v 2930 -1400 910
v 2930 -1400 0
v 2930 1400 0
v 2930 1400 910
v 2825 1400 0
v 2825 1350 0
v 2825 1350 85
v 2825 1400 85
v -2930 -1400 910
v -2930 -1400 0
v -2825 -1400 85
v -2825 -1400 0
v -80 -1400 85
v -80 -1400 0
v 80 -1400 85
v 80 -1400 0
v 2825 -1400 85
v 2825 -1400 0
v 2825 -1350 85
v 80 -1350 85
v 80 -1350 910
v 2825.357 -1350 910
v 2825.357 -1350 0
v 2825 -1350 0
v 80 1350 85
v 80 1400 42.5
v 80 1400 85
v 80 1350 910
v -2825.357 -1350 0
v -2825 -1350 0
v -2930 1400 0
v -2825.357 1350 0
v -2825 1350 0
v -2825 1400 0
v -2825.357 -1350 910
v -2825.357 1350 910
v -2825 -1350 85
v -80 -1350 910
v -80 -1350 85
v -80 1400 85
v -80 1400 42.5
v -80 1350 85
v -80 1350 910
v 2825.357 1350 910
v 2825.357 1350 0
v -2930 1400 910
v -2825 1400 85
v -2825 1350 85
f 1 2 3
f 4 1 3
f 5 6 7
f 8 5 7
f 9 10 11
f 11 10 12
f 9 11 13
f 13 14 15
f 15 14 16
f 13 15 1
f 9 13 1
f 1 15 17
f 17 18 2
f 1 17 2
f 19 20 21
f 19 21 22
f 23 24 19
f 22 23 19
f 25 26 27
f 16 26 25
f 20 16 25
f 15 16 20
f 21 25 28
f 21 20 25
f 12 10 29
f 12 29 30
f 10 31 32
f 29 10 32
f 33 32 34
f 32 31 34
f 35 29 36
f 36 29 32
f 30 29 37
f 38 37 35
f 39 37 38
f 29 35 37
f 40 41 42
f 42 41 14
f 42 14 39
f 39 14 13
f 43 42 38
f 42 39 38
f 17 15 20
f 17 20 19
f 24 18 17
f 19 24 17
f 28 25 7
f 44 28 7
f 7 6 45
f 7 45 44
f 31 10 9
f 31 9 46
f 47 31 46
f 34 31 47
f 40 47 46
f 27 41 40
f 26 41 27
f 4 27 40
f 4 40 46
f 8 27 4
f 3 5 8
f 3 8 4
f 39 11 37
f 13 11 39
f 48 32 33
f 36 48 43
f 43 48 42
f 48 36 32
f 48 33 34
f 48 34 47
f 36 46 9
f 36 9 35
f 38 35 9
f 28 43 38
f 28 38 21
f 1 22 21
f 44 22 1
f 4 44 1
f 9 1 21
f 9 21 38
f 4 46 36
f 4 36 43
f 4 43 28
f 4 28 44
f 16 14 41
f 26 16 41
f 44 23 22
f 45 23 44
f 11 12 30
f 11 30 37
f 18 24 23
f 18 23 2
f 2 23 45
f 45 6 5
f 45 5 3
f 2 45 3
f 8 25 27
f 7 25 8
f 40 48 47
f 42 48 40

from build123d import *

# Parameters (mm, degrees)
SKETCH_1_W          = 5860
SKETCH_1_H          = 2800
SKETCH_1_W_2        = 2745.357142857
SKETCH_1_H_2        = 2700
EXTRUDE_1_DEPTH     = 910
SKETCH_2_W          = 2745
SKETCH_2_H          = 85
CUT_EXTRUDE_1_DEPTH = 2801
CUT_EXTRUDE_2_DEPTH = 160


with BuildPart() as part:
    # Эскиз1 → Бобышка-Вытянуть1 (new body)
    with BuildSketch(Plane.XY):
        Rectangle(SKETCH_1_W, SKETCH_1_H)
        with Locations((-1452.678571429, 0)):
            Rectangle(SKETCH_1_W_2, SKETCH_1_H_2, mode=Mode.SUBTRACT)
        with Locations((1452.678571429, 0)):
            Rectangle(SKETCH_1_W_2, SKETCH_1_H_2, mode=Mode.SUBTRACT)
    extrude(amount=EXTRUDE_1_DEPTH)

    # Эскиз2 → Вырез-Вытянуть1 (cut, through all)
    with BuildSketch(Plane.XZ.offset(1400)):
        with Locations((-1452.5, 42.5)):
            Rectangle(SKETCH_2_W, SKETCH_2_H)
        with Locations((1452.5, 42.5)):
            Rectangle(SKETCH_2_W, SKETCH_2_H)
    extrude(amount=-CUT_EXTRUDE_1_DEPTH, mode=Mode.SUBTRACT)

    # Эскиз3 → Вырез-Вытянуть2 (cut)
    with BuildSketch(Plane.ZY.offset(80)):
        Polygon((0, 1400), (0, -1400), (42.5, 1400), align=None)
    extrude(amount=-CUT_EXTRUDE_2_DEPTH, mode=Mode.SUBTRACT)


solid = part.part
